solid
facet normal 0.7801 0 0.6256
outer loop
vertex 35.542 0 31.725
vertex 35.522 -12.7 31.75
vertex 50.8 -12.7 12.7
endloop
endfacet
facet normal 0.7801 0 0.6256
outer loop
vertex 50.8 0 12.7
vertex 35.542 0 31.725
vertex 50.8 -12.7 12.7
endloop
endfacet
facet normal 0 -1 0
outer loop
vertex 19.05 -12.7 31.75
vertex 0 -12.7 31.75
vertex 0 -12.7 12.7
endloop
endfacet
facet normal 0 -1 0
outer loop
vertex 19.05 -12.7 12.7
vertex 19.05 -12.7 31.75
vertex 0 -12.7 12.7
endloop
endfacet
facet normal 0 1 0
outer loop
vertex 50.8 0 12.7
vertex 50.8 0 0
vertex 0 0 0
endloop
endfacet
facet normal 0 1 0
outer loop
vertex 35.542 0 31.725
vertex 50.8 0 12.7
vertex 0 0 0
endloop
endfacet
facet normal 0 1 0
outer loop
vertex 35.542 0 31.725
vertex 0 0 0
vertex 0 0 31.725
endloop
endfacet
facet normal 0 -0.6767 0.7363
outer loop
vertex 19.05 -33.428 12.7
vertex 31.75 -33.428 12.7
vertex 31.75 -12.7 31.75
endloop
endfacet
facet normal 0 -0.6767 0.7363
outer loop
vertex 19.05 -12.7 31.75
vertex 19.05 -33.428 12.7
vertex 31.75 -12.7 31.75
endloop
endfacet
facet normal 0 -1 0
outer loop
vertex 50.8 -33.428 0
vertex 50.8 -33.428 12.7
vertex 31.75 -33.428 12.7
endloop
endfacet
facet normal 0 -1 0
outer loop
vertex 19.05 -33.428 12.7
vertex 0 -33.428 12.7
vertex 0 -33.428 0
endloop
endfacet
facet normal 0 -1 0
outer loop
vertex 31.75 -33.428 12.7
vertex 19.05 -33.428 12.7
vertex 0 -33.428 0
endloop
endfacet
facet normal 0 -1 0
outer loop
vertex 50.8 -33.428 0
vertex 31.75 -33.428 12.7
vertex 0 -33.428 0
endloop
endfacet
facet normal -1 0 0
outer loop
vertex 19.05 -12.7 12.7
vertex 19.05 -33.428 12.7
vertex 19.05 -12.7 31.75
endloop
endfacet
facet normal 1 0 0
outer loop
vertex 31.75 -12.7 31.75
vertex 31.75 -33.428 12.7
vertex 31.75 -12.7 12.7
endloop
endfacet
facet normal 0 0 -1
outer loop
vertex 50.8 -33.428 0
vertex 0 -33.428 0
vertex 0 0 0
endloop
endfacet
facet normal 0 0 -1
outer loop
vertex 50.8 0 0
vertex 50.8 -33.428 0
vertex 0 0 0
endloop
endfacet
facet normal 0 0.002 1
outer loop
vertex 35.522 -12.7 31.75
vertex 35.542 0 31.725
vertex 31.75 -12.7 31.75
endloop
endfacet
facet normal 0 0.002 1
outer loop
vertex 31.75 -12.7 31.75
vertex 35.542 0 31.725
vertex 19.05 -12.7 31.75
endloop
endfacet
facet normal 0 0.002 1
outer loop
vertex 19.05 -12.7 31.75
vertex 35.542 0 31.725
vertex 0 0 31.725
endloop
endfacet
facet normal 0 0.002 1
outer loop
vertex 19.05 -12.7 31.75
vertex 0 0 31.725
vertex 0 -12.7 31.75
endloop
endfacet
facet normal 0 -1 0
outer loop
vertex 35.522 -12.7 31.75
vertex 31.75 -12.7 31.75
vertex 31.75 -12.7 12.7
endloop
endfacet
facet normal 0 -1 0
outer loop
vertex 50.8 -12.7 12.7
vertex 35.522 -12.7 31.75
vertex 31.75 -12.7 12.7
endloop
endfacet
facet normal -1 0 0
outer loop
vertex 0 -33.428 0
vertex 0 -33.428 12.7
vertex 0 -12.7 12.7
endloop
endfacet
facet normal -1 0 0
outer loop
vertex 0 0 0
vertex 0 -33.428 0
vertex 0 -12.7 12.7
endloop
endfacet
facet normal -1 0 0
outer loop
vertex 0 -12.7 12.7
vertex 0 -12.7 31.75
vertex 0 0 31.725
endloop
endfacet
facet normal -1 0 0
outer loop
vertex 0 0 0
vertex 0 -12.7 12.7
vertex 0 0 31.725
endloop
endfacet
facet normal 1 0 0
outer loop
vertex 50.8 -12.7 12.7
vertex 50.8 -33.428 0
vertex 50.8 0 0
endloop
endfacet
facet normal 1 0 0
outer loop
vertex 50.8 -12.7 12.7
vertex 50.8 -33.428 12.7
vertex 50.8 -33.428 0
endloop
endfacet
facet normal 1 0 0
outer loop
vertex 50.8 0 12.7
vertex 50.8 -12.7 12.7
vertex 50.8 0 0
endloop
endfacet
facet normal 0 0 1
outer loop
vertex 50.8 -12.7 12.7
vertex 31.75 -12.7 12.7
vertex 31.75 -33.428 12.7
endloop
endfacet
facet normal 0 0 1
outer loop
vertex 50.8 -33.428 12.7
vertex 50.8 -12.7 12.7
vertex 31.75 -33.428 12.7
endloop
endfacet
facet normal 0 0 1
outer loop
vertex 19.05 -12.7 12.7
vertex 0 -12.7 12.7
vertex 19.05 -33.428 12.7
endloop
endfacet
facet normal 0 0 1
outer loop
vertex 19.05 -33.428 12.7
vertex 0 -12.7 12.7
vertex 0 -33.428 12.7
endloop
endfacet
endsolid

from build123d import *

# Parameters (mm, degrees)
F1_DEPTH = 50.8
F3_DEPTH = 25.4
F4_W     = 12.7
F4_H     = 20.7277986608
F5_DEPTH = 19.05
F7_DEPTH = 25.4


with BuildPart() as f1:
    # F0 (on Right) → F1 (new body)
    with BuildSketch(Plane.YZ):
        Polygon((0, 0), (0, 31.7254364491), (-12.6999762453, 31.75), (-12.6999762453, 12.7), (-33.4277749062, 12.7), (-33.4277749062, 0), align=None)
    extrude(amount=F1_DEPTH)

    # F2 (on face) → F3 (cut)
    with BuildSketch(Plane.XZ.offset(12.6999762453)):
        Polygon((50.8, 31.75), (35.5220995843, 31.75), (50.8, 12.7), align=None)
    extrude(amount=-F3_DEPTH, mode=Mode.SUBTRACT)

    # F4 (on face) → F5 (join)
    with BuildSketch(Plane.XY.offset(12.7)):
        with Locations((25.4, -23.0638755757)):
            Rectangle(F4_W, F4_H)
    extrude(amount=F5_DEPTH)

    # F6 (on face) → F7 (cut)
    with BuildSketch(Plane.YZ.offset(31.75)):
        Polygon((-33.4277749062, 31.75), (-33.4277749062, 12.7), (-12.6999762453, 31.75), align=None)
    extrude(amount=-F7_DEPTH, mode=Mode.SUBTRACT)


solid = f1.part
